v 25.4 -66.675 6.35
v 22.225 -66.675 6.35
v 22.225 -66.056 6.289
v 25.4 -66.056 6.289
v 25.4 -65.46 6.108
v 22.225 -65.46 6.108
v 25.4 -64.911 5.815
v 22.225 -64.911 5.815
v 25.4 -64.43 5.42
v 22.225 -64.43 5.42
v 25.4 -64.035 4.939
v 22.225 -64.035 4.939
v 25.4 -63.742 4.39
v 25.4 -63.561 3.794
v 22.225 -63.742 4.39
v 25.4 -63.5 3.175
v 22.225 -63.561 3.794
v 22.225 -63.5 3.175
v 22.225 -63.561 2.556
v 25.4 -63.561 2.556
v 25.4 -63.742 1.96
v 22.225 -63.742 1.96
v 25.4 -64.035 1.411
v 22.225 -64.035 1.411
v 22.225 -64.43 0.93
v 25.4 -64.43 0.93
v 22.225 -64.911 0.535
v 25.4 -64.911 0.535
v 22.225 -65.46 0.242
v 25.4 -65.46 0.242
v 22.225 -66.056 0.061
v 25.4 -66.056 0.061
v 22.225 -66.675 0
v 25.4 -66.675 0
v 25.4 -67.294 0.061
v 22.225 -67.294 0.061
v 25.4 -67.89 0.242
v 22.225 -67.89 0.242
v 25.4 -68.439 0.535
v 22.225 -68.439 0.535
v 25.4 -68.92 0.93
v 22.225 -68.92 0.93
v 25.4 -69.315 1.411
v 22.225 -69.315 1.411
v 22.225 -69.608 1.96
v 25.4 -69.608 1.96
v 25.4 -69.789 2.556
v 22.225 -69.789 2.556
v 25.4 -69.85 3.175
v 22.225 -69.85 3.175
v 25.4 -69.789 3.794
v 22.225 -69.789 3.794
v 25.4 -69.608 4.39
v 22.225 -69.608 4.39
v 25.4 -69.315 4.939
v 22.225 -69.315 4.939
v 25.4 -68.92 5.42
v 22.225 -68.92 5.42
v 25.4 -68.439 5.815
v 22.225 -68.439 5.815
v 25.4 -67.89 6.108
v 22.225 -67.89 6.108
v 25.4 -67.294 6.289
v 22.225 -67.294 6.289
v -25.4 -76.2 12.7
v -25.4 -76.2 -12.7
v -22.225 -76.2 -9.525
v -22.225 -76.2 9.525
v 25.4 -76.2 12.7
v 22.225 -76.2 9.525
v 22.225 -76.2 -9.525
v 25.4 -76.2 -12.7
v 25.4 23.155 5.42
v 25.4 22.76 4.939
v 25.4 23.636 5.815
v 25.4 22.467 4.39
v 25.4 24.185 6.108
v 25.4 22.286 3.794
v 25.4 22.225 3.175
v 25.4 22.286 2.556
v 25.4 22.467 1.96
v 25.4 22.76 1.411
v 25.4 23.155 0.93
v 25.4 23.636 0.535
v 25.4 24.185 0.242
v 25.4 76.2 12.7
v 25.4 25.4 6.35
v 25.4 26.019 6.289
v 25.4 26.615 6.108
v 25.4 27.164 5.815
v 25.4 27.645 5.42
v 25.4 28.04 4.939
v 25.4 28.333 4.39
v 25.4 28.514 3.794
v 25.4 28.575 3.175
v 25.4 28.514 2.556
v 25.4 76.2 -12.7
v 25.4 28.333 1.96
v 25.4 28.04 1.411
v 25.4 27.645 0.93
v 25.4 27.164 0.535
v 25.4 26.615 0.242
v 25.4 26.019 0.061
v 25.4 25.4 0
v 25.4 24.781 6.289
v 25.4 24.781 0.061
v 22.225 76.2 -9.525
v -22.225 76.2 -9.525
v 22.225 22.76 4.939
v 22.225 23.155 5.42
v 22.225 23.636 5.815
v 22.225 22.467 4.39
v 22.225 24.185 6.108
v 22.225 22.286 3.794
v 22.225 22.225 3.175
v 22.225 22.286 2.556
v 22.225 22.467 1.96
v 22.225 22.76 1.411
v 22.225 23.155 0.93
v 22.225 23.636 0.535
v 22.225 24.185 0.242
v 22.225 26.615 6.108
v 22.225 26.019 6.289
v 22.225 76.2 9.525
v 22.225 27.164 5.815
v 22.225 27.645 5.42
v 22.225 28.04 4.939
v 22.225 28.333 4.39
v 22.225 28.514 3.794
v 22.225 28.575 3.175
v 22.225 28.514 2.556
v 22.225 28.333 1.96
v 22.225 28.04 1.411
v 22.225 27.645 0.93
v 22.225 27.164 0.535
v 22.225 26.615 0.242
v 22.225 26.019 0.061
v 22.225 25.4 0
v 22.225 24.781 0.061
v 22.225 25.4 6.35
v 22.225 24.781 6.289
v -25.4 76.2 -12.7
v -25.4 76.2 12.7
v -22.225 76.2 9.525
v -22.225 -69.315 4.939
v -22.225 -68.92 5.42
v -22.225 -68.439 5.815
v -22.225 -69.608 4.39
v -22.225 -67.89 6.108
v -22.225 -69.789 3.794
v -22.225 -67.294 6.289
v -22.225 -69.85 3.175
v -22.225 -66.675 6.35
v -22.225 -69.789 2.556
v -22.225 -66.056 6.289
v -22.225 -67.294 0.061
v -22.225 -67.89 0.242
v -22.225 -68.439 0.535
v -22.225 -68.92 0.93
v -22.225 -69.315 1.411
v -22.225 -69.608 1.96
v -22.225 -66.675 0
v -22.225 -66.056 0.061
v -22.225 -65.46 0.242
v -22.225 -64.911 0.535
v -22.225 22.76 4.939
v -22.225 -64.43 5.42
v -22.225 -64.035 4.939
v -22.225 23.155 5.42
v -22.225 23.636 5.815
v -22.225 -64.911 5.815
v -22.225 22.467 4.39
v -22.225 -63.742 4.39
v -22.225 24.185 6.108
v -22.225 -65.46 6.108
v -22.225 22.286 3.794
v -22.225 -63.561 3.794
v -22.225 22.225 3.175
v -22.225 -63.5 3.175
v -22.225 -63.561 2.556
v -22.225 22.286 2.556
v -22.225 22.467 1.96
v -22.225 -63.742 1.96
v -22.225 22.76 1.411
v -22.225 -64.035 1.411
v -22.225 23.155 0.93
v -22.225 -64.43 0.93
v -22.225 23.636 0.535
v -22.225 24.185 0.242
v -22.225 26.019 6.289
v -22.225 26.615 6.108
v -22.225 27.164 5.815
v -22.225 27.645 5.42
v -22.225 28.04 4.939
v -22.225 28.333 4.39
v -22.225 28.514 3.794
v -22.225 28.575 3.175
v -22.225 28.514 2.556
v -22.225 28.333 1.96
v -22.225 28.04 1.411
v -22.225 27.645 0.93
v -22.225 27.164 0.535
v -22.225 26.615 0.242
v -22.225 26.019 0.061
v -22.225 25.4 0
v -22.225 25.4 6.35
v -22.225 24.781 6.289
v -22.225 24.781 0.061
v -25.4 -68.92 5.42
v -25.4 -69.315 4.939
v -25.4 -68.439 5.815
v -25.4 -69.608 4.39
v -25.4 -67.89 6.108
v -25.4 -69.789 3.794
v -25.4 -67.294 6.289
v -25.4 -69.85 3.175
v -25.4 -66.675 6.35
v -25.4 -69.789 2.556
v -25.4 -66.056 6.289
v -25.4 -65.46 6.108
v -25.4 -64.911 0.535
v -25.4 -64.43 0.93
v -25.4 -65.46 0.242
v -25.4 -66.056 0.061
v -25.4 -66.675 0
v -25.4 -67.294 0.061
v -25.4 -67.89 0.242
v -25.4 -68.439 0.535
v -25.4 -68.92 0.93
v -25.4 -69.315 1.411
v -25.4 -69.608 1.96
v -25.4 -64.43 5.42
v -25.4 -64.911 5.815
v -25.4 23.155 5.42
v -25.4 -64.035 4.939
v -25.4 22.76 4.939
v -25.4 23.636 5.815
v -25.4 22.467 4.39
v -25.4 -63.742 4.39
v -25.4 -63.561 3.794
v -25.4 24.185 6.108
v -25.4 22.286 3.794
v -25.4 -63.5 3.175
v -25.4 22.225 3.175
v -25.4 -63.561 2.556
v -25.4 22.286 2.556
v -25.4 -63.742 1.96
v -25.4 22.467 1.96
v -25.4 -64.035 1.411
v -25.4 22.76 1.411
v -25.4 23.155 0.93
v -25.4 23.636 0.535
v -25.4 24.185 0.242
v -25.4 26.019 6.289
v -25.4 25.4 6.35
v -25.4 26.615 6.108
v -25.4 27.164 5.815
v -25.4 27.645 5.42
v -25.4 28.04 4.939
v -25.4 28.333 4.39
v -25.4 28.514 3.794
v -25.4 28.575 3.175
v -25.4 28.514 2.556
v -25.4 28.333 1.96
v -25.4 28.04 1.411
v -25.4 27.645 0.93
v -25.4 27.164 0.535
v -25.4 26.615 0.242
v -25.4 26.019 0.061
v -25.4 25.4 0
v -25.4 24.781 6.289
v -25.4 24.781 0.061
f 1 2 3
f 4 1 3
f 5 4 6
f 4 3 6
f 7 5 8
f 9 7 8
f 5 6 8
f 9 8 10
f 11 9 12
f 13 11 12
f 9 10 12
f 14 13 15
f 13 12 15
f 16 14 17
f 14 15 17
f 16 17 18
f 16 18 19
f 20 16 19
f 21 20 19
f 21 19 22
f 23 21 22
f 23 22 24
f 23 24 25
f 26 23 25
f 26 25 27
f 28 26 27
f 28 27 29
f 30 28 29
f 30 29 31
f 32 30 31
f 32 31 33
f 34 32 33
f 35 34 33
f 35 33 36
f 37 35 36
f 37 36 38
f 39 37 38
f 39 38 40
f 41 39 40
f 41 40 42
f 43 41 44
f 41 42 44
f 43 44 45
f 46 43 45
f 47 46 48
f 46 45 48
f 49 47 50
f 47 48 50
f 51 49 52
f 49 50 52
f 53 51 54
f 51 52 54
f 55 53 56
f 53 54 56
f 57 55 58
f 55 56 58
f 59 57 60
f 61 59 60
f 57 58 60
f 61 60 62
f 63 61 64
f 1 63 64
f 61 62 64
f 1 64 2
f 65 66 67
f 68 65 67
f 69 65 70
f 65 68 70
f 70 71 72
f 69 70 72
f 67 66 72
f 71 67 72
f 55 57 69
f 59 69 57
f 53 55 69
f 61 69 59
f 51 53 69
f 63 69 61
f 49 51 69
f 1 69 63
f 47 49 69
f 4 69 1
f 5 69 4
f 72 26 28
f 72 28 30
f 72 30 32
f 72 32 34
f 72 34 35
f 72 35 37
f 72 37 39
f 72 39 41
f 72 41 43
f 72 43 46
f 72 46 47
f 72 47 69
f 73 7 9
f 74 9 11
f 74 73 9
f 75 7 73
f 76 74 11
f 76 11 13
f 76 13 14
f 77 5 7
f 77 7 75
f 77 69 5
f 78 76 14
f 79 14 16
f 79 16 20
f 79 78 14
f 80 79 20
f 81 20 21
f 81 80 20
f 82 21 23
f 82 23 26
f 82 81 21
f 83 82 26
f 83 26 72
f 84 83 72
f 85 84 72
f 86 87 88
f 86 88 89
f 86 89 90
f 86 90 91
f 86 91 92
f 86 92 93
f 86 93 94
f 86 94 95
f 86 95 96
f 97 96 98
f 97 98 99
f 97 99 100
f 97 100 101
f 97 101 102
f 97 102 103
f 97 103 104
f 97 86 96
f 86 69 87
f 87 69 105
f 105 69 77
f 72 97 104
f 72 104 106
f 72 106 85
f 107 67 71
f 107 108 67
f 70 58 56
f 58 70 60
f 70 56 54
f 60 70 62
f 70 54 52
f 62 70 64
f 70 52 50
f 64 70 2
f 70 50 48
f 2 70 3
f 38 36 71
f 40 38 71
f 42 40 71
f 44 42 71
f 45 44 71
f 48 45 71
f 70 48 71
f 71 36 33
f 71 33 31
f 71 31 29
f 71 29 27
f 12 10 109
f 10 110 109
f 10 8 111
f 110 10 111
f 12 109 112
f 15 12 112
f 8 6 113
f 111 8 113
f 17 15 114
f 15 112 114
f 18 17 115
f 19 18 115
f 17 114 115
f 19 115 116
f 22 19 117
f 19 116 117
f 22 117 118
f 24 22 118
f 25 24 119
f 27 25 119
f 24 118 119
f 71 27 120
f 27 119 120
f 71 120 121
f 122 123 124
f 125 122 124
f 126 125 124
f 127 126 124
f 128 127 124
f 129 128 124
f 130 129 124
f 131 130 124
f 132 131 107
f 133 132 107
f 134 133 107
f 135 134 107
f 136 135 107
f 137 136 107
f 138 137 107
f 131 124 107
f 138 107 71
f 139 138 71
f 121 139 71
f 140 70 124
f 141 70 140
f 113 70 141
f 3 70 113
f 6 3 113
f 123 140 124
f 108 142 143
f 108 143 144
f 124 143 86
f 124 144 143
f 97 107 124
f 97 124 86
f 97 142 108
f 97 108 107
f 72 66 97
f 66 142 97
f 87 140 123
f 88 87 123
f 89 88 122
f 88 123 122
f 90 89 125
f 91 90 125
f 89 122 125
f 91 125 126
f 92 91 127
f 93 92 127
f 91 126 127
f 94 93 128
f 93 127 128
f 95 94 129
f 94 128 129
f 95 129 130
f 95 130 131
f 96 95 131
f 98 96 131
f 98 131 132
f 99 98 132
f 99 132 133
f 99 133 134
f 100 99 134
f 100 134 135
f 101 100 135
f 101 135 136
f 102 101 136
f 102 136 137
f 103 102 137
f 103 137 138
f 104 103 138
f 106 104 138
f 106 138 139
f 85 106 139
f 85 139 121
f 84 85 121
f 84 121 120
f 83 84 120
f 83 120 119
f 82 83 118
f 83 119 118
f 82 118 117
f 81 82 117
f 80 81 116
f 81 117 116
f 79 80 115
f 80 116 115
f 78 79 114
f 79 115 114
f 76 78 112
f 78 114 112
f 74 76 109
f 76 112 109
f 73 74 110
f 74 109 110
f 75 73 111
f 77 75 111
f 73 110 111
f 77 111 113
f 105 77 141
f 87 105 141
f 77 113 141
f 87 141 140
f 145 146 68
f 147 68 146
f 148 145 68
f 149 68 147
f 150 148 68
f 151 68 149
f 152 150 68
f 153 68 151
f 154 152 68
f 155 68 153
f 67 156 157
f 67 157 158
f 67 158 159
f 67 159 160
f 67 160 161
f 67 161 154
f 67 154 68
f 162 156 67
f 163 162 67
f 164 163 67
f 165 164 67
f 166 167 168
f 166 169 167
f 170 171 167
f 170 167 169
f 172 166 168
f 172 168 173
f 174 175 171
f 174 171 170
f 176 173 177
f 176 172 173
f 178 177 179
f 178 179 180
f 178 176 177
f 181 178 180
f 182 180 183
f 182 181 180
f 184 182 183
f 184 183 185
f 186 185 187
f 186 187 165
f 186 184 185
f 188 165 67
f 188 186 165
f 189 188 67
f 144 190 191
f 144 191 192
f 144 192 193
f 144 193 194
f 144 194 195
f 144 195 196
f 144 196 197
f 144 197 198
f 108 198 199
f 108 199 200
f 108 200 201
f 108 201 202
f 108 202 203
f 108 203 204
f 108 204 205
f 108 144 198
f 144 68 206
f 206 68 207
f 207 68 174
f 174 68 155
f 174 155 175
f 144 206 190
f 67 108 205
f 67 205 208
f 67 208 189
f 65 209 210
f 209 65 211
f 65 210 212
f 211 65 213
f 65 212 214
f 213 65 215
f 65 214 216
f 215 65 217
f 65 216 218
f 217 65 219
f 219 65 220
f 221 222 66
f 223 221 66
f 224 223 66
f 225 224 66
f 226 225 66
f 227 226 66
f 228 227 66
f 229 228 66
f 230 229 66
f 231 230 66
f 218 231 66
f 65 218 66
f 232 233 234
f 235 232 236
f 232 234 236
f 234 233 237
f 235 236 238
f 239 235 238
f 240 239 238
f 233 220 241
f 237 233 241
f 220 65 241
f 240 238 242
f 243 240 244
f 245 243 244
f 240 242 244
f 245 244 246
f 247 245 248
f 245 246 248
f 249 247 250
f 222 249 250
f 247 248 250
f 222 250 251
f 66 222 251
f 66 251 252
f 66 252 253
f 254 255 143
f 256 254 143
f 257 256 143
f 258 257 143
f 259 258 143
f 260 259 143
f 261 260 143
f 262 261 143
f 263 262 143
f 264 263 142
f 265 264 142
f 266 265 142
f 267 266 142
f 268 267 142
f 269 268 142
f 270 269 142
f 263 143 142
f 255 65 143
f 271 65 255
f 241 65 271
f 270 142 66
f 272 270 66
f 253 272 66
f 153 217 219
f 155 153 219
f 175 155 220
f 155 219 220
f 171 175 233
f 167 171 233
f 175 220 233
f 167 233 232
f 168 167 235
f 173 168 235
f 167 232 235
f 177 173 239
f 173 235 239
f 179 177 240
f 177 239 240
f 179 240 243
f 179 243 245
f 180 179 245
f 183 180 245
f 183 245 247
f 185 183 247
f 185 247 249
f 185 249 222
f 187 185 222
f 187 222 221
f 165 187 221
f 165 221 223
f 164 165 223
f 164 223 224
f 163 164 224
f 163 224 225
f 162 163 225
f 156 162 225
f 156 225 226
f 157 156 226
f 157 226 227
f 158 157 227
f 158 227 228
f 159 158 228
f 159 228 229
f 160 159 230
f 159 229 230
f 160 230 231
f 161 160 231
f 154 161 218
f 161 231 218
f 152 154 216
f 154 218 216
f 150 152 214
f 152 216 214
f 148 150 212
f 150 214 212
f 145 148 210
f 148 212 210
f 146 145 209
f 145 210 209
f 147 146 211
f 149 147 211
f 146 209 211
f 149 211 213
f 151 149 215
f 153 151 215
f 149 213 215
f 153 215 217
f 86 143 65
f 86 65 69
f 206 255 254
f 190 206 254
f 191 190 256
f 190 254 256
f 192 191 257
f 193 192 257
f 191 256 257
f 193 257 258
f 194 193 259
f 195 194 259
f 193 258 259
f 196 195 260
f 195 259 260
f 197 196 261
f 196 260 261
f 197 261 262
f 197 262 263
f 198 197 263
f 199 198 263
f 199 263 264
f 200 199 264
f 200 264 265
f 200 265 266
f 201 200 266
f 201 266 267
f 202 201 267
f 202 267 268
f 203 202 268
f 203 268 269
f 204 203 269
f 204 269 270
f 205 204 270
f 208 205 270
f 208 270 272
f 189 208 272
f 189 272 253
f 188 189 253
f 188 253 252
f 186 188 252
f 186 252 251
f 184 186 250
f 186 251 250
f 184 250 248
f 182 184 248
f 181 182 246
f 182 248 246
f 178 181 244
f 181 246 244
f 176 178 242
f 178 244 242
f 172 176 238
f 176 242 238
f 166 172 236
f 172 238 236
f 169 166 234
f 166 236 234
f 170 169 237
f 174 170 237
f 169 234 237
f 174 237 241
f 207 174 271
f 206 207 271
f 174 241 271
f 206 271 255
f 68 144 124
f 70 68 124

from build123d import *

# Parameters (mm, degrees)
SKETCH1_W           = 50.8
SKETCH1_H           = 25.4
SKETCH1_W_2         = 44.45
SKETCH1_H_2         = 19.05
BOSS_EXTRUDE1_DEPTH = 76.2
SKETCH2_R           = 3.175
CUT_EXTRUDE1_DEPTH  = 93.457395594


with BuildPart() as part:
    # Sketch1 → Boss-Extrude1 (new, symmetric)
    with BuildSketch(Plane(origin=(0, 0, 0), x_dir=(1, 0, 0), z_dir=(0, 1, 0))):
        Rectangle(SKETCH1_W, SKETCH1_H)
        Rectangle(SKETCH1_W_2, SKETCH1_H_2, mode=Mode.SUBTRACT)
    extrude(amount=BOSS_EXTRUDE1_DEPTH, both=True)

    # Sketch2 → Cut-Extrude1 (cut, through all)
    with BuildSketch(Plane.ZY.offset(25.4)):
        with Locations((3.175, -66.675)):
            Circle(SKETCH2_R)
        with Locations((3.175, 25.4)):
            Circle(SKETCH2_R)
    extrude(amount=-CUT_EXTRUDE1_DEPTH, mode=Mode.SUBTRACT)


solid = part.part
